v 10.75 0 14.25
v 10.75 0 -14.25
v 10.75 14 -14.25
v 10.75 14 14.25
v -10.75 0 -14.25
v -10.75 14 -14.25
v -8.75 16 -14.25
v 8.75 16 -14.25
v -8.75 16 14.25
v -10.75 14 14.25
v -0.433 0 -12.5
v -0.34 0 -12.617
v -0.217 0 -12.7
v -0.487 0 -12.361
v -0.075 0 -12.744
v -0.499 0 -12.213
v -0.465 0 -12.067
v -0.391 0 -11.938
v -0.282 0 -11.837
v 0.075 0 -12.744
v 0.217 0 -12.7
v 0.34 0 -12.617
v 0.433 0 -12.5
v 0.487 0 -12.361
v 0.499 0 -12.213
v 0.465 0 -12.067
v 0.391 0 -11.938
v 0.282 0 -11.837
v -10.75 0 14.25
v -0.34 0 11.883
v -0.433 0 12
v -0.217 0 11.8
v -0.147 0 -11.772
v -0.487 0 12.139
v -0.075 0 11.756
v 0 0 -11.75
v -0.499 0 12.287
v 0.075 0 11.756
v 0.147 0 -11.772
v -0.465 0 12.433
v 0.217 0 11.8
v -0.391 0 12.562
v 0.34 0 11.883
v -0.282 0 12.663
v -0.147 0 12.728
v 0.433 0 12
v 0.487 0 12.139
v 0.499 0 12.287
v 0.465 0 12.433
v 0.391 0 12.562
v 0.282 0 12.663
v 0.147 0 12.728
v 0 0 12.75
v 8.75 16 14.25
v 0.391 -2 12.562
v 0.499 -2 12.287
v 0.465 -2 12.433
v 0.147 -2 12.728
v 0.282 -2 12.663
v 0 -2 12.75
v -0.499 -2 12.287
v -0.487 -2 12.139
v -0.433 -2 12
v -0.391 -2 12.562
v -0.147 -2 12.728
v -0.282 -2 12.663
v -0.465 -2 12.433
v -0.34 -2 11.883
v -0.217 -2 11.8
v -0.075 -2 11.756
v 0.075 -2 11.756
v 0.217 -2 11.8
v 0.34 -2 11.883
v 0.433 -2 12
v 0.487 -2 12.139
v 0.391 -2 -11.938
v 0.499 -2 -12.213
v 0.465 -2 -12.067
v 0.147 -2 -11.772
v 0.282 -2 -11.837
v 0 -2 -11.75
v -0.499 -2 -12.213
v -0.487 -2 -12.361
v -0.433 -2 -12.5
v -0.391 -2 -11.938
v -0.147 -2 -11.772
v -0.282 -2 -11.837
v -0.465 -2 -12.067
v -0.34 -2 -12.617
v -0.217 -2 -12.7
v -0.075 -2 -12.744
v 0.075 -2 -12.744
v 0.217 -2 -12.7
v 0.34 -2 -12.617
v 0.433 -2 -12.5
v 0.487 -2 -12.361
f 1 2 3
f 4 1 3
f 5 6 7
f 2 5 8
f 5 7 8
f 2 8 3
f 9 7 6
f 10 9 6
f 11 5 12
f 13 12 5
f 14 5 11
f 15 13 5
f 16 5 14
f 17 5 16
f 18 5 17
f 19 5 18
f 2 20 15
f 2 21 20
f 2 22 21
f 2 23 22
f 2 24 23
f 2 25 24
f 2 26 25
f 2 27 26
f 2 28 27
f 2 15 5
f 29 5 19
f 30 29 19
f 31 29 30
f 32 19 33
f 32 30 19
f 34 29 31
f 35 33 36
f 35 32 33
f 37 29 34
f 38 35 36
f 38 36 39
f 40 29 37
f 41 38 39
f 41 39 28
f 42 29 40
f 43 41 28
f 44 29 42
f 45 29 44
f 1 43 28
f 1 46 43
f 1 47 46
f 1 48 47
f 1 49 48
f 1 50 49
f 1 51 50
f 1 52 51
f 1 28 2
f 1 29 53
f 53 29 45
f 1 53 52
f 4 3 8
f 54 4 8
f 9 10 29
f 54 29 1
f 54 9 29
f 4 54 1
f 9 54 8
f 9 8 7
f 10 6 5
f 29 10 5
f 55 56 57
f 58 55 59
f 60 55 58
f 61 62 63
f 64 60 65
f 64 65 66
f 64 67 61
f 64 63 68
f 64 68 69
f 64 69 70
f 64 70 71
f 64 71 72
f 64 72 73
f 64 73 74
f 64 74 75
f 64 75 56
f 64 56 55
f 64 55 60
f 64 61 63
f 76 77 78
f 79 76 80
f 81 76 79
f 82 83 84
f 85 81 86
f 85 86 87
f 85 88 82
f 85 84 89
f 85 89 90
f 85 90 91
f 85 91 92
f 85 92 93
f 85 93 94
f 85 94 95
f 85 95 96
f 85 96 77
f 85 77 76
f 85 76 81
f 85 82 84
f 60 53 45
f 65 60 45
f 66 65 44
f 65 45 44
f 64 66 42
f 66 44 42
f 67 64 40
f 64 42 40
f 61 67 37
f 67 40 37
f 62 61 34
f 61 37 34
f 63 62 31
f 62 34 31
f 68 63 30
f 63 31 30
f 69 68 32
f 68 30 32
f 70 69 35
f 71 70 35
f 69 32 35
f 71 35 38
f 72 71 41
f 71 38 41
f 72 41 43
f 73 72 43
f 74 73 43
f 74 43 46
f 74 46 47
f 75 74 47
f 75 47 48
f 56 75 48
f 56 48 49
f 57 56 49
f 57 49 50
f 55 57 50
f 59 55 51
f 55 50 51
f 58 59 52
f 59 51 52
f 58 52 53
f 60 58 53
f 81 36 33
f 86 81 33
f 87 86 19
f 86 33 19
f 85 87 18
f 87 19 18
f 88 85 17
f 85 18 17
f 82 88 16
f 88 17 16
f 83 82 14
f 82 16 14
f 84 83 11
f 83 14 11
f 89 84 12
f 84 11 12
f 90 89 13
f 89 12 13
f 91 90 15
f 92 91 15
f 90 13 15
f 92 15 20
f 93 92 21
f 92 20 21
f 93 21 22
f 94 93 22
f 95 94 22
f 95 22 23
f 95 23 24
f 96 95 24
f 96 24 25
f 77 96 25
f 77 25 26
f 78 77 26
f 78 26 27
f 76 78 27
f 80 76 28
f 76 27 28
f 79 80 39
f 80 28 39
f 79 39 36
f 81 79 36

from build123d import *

# Parameters (mm, degrees)
EXTRUDE_2_DEPTH = 14.25
SKETCH_2_R      = 0.5
EXTRUDE_3_DEPTH = 2


with BuildPart() as part:
    # Эскиз1 → Бобышка-Вытянуть2 (new, symmetric)
    with BuildSketch(Plane.XY):
        Polygon((-10.75, 0), (10.75, 0), (10.75, 14), (8.75, 16), (-8.75, 16), (-10.75, 14), align=None)
    extrude(amount=EXTRUDE_2_DEPTH, both=True)

    # Эскиз2 → Бобышка-Вытянуть3 (add)
    with BuildSketch(Plane.XZ):
        with Locations(Location((0, 12.25, 0), (0, 0, 90))):
            Circle(SKETCH_2_R)
        with Locations(Location((0, -12.25, 0), (0, 0, 90))):
            Circle(SKETCH_2_R)
    extrude(amount=EXTRUDE_3_DEPTH)


solid = part.part
